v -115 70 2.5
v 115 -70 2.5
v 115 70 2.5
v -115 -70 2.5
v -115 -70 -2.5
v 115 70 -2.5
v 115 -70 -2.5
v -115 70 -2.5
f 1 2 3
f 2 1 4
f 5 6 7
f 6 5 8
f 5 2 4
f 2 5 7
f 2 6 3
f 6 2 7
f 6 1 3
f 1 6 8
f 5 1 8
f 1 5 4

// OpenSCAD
// ========================================
// a 230 x 140 x 5 mm plate
// NeuroCAD canonical IR; dimensions are millimetres
// ========================================
$fn = 48;

cube(size=[230, 140, 5], center=true);
